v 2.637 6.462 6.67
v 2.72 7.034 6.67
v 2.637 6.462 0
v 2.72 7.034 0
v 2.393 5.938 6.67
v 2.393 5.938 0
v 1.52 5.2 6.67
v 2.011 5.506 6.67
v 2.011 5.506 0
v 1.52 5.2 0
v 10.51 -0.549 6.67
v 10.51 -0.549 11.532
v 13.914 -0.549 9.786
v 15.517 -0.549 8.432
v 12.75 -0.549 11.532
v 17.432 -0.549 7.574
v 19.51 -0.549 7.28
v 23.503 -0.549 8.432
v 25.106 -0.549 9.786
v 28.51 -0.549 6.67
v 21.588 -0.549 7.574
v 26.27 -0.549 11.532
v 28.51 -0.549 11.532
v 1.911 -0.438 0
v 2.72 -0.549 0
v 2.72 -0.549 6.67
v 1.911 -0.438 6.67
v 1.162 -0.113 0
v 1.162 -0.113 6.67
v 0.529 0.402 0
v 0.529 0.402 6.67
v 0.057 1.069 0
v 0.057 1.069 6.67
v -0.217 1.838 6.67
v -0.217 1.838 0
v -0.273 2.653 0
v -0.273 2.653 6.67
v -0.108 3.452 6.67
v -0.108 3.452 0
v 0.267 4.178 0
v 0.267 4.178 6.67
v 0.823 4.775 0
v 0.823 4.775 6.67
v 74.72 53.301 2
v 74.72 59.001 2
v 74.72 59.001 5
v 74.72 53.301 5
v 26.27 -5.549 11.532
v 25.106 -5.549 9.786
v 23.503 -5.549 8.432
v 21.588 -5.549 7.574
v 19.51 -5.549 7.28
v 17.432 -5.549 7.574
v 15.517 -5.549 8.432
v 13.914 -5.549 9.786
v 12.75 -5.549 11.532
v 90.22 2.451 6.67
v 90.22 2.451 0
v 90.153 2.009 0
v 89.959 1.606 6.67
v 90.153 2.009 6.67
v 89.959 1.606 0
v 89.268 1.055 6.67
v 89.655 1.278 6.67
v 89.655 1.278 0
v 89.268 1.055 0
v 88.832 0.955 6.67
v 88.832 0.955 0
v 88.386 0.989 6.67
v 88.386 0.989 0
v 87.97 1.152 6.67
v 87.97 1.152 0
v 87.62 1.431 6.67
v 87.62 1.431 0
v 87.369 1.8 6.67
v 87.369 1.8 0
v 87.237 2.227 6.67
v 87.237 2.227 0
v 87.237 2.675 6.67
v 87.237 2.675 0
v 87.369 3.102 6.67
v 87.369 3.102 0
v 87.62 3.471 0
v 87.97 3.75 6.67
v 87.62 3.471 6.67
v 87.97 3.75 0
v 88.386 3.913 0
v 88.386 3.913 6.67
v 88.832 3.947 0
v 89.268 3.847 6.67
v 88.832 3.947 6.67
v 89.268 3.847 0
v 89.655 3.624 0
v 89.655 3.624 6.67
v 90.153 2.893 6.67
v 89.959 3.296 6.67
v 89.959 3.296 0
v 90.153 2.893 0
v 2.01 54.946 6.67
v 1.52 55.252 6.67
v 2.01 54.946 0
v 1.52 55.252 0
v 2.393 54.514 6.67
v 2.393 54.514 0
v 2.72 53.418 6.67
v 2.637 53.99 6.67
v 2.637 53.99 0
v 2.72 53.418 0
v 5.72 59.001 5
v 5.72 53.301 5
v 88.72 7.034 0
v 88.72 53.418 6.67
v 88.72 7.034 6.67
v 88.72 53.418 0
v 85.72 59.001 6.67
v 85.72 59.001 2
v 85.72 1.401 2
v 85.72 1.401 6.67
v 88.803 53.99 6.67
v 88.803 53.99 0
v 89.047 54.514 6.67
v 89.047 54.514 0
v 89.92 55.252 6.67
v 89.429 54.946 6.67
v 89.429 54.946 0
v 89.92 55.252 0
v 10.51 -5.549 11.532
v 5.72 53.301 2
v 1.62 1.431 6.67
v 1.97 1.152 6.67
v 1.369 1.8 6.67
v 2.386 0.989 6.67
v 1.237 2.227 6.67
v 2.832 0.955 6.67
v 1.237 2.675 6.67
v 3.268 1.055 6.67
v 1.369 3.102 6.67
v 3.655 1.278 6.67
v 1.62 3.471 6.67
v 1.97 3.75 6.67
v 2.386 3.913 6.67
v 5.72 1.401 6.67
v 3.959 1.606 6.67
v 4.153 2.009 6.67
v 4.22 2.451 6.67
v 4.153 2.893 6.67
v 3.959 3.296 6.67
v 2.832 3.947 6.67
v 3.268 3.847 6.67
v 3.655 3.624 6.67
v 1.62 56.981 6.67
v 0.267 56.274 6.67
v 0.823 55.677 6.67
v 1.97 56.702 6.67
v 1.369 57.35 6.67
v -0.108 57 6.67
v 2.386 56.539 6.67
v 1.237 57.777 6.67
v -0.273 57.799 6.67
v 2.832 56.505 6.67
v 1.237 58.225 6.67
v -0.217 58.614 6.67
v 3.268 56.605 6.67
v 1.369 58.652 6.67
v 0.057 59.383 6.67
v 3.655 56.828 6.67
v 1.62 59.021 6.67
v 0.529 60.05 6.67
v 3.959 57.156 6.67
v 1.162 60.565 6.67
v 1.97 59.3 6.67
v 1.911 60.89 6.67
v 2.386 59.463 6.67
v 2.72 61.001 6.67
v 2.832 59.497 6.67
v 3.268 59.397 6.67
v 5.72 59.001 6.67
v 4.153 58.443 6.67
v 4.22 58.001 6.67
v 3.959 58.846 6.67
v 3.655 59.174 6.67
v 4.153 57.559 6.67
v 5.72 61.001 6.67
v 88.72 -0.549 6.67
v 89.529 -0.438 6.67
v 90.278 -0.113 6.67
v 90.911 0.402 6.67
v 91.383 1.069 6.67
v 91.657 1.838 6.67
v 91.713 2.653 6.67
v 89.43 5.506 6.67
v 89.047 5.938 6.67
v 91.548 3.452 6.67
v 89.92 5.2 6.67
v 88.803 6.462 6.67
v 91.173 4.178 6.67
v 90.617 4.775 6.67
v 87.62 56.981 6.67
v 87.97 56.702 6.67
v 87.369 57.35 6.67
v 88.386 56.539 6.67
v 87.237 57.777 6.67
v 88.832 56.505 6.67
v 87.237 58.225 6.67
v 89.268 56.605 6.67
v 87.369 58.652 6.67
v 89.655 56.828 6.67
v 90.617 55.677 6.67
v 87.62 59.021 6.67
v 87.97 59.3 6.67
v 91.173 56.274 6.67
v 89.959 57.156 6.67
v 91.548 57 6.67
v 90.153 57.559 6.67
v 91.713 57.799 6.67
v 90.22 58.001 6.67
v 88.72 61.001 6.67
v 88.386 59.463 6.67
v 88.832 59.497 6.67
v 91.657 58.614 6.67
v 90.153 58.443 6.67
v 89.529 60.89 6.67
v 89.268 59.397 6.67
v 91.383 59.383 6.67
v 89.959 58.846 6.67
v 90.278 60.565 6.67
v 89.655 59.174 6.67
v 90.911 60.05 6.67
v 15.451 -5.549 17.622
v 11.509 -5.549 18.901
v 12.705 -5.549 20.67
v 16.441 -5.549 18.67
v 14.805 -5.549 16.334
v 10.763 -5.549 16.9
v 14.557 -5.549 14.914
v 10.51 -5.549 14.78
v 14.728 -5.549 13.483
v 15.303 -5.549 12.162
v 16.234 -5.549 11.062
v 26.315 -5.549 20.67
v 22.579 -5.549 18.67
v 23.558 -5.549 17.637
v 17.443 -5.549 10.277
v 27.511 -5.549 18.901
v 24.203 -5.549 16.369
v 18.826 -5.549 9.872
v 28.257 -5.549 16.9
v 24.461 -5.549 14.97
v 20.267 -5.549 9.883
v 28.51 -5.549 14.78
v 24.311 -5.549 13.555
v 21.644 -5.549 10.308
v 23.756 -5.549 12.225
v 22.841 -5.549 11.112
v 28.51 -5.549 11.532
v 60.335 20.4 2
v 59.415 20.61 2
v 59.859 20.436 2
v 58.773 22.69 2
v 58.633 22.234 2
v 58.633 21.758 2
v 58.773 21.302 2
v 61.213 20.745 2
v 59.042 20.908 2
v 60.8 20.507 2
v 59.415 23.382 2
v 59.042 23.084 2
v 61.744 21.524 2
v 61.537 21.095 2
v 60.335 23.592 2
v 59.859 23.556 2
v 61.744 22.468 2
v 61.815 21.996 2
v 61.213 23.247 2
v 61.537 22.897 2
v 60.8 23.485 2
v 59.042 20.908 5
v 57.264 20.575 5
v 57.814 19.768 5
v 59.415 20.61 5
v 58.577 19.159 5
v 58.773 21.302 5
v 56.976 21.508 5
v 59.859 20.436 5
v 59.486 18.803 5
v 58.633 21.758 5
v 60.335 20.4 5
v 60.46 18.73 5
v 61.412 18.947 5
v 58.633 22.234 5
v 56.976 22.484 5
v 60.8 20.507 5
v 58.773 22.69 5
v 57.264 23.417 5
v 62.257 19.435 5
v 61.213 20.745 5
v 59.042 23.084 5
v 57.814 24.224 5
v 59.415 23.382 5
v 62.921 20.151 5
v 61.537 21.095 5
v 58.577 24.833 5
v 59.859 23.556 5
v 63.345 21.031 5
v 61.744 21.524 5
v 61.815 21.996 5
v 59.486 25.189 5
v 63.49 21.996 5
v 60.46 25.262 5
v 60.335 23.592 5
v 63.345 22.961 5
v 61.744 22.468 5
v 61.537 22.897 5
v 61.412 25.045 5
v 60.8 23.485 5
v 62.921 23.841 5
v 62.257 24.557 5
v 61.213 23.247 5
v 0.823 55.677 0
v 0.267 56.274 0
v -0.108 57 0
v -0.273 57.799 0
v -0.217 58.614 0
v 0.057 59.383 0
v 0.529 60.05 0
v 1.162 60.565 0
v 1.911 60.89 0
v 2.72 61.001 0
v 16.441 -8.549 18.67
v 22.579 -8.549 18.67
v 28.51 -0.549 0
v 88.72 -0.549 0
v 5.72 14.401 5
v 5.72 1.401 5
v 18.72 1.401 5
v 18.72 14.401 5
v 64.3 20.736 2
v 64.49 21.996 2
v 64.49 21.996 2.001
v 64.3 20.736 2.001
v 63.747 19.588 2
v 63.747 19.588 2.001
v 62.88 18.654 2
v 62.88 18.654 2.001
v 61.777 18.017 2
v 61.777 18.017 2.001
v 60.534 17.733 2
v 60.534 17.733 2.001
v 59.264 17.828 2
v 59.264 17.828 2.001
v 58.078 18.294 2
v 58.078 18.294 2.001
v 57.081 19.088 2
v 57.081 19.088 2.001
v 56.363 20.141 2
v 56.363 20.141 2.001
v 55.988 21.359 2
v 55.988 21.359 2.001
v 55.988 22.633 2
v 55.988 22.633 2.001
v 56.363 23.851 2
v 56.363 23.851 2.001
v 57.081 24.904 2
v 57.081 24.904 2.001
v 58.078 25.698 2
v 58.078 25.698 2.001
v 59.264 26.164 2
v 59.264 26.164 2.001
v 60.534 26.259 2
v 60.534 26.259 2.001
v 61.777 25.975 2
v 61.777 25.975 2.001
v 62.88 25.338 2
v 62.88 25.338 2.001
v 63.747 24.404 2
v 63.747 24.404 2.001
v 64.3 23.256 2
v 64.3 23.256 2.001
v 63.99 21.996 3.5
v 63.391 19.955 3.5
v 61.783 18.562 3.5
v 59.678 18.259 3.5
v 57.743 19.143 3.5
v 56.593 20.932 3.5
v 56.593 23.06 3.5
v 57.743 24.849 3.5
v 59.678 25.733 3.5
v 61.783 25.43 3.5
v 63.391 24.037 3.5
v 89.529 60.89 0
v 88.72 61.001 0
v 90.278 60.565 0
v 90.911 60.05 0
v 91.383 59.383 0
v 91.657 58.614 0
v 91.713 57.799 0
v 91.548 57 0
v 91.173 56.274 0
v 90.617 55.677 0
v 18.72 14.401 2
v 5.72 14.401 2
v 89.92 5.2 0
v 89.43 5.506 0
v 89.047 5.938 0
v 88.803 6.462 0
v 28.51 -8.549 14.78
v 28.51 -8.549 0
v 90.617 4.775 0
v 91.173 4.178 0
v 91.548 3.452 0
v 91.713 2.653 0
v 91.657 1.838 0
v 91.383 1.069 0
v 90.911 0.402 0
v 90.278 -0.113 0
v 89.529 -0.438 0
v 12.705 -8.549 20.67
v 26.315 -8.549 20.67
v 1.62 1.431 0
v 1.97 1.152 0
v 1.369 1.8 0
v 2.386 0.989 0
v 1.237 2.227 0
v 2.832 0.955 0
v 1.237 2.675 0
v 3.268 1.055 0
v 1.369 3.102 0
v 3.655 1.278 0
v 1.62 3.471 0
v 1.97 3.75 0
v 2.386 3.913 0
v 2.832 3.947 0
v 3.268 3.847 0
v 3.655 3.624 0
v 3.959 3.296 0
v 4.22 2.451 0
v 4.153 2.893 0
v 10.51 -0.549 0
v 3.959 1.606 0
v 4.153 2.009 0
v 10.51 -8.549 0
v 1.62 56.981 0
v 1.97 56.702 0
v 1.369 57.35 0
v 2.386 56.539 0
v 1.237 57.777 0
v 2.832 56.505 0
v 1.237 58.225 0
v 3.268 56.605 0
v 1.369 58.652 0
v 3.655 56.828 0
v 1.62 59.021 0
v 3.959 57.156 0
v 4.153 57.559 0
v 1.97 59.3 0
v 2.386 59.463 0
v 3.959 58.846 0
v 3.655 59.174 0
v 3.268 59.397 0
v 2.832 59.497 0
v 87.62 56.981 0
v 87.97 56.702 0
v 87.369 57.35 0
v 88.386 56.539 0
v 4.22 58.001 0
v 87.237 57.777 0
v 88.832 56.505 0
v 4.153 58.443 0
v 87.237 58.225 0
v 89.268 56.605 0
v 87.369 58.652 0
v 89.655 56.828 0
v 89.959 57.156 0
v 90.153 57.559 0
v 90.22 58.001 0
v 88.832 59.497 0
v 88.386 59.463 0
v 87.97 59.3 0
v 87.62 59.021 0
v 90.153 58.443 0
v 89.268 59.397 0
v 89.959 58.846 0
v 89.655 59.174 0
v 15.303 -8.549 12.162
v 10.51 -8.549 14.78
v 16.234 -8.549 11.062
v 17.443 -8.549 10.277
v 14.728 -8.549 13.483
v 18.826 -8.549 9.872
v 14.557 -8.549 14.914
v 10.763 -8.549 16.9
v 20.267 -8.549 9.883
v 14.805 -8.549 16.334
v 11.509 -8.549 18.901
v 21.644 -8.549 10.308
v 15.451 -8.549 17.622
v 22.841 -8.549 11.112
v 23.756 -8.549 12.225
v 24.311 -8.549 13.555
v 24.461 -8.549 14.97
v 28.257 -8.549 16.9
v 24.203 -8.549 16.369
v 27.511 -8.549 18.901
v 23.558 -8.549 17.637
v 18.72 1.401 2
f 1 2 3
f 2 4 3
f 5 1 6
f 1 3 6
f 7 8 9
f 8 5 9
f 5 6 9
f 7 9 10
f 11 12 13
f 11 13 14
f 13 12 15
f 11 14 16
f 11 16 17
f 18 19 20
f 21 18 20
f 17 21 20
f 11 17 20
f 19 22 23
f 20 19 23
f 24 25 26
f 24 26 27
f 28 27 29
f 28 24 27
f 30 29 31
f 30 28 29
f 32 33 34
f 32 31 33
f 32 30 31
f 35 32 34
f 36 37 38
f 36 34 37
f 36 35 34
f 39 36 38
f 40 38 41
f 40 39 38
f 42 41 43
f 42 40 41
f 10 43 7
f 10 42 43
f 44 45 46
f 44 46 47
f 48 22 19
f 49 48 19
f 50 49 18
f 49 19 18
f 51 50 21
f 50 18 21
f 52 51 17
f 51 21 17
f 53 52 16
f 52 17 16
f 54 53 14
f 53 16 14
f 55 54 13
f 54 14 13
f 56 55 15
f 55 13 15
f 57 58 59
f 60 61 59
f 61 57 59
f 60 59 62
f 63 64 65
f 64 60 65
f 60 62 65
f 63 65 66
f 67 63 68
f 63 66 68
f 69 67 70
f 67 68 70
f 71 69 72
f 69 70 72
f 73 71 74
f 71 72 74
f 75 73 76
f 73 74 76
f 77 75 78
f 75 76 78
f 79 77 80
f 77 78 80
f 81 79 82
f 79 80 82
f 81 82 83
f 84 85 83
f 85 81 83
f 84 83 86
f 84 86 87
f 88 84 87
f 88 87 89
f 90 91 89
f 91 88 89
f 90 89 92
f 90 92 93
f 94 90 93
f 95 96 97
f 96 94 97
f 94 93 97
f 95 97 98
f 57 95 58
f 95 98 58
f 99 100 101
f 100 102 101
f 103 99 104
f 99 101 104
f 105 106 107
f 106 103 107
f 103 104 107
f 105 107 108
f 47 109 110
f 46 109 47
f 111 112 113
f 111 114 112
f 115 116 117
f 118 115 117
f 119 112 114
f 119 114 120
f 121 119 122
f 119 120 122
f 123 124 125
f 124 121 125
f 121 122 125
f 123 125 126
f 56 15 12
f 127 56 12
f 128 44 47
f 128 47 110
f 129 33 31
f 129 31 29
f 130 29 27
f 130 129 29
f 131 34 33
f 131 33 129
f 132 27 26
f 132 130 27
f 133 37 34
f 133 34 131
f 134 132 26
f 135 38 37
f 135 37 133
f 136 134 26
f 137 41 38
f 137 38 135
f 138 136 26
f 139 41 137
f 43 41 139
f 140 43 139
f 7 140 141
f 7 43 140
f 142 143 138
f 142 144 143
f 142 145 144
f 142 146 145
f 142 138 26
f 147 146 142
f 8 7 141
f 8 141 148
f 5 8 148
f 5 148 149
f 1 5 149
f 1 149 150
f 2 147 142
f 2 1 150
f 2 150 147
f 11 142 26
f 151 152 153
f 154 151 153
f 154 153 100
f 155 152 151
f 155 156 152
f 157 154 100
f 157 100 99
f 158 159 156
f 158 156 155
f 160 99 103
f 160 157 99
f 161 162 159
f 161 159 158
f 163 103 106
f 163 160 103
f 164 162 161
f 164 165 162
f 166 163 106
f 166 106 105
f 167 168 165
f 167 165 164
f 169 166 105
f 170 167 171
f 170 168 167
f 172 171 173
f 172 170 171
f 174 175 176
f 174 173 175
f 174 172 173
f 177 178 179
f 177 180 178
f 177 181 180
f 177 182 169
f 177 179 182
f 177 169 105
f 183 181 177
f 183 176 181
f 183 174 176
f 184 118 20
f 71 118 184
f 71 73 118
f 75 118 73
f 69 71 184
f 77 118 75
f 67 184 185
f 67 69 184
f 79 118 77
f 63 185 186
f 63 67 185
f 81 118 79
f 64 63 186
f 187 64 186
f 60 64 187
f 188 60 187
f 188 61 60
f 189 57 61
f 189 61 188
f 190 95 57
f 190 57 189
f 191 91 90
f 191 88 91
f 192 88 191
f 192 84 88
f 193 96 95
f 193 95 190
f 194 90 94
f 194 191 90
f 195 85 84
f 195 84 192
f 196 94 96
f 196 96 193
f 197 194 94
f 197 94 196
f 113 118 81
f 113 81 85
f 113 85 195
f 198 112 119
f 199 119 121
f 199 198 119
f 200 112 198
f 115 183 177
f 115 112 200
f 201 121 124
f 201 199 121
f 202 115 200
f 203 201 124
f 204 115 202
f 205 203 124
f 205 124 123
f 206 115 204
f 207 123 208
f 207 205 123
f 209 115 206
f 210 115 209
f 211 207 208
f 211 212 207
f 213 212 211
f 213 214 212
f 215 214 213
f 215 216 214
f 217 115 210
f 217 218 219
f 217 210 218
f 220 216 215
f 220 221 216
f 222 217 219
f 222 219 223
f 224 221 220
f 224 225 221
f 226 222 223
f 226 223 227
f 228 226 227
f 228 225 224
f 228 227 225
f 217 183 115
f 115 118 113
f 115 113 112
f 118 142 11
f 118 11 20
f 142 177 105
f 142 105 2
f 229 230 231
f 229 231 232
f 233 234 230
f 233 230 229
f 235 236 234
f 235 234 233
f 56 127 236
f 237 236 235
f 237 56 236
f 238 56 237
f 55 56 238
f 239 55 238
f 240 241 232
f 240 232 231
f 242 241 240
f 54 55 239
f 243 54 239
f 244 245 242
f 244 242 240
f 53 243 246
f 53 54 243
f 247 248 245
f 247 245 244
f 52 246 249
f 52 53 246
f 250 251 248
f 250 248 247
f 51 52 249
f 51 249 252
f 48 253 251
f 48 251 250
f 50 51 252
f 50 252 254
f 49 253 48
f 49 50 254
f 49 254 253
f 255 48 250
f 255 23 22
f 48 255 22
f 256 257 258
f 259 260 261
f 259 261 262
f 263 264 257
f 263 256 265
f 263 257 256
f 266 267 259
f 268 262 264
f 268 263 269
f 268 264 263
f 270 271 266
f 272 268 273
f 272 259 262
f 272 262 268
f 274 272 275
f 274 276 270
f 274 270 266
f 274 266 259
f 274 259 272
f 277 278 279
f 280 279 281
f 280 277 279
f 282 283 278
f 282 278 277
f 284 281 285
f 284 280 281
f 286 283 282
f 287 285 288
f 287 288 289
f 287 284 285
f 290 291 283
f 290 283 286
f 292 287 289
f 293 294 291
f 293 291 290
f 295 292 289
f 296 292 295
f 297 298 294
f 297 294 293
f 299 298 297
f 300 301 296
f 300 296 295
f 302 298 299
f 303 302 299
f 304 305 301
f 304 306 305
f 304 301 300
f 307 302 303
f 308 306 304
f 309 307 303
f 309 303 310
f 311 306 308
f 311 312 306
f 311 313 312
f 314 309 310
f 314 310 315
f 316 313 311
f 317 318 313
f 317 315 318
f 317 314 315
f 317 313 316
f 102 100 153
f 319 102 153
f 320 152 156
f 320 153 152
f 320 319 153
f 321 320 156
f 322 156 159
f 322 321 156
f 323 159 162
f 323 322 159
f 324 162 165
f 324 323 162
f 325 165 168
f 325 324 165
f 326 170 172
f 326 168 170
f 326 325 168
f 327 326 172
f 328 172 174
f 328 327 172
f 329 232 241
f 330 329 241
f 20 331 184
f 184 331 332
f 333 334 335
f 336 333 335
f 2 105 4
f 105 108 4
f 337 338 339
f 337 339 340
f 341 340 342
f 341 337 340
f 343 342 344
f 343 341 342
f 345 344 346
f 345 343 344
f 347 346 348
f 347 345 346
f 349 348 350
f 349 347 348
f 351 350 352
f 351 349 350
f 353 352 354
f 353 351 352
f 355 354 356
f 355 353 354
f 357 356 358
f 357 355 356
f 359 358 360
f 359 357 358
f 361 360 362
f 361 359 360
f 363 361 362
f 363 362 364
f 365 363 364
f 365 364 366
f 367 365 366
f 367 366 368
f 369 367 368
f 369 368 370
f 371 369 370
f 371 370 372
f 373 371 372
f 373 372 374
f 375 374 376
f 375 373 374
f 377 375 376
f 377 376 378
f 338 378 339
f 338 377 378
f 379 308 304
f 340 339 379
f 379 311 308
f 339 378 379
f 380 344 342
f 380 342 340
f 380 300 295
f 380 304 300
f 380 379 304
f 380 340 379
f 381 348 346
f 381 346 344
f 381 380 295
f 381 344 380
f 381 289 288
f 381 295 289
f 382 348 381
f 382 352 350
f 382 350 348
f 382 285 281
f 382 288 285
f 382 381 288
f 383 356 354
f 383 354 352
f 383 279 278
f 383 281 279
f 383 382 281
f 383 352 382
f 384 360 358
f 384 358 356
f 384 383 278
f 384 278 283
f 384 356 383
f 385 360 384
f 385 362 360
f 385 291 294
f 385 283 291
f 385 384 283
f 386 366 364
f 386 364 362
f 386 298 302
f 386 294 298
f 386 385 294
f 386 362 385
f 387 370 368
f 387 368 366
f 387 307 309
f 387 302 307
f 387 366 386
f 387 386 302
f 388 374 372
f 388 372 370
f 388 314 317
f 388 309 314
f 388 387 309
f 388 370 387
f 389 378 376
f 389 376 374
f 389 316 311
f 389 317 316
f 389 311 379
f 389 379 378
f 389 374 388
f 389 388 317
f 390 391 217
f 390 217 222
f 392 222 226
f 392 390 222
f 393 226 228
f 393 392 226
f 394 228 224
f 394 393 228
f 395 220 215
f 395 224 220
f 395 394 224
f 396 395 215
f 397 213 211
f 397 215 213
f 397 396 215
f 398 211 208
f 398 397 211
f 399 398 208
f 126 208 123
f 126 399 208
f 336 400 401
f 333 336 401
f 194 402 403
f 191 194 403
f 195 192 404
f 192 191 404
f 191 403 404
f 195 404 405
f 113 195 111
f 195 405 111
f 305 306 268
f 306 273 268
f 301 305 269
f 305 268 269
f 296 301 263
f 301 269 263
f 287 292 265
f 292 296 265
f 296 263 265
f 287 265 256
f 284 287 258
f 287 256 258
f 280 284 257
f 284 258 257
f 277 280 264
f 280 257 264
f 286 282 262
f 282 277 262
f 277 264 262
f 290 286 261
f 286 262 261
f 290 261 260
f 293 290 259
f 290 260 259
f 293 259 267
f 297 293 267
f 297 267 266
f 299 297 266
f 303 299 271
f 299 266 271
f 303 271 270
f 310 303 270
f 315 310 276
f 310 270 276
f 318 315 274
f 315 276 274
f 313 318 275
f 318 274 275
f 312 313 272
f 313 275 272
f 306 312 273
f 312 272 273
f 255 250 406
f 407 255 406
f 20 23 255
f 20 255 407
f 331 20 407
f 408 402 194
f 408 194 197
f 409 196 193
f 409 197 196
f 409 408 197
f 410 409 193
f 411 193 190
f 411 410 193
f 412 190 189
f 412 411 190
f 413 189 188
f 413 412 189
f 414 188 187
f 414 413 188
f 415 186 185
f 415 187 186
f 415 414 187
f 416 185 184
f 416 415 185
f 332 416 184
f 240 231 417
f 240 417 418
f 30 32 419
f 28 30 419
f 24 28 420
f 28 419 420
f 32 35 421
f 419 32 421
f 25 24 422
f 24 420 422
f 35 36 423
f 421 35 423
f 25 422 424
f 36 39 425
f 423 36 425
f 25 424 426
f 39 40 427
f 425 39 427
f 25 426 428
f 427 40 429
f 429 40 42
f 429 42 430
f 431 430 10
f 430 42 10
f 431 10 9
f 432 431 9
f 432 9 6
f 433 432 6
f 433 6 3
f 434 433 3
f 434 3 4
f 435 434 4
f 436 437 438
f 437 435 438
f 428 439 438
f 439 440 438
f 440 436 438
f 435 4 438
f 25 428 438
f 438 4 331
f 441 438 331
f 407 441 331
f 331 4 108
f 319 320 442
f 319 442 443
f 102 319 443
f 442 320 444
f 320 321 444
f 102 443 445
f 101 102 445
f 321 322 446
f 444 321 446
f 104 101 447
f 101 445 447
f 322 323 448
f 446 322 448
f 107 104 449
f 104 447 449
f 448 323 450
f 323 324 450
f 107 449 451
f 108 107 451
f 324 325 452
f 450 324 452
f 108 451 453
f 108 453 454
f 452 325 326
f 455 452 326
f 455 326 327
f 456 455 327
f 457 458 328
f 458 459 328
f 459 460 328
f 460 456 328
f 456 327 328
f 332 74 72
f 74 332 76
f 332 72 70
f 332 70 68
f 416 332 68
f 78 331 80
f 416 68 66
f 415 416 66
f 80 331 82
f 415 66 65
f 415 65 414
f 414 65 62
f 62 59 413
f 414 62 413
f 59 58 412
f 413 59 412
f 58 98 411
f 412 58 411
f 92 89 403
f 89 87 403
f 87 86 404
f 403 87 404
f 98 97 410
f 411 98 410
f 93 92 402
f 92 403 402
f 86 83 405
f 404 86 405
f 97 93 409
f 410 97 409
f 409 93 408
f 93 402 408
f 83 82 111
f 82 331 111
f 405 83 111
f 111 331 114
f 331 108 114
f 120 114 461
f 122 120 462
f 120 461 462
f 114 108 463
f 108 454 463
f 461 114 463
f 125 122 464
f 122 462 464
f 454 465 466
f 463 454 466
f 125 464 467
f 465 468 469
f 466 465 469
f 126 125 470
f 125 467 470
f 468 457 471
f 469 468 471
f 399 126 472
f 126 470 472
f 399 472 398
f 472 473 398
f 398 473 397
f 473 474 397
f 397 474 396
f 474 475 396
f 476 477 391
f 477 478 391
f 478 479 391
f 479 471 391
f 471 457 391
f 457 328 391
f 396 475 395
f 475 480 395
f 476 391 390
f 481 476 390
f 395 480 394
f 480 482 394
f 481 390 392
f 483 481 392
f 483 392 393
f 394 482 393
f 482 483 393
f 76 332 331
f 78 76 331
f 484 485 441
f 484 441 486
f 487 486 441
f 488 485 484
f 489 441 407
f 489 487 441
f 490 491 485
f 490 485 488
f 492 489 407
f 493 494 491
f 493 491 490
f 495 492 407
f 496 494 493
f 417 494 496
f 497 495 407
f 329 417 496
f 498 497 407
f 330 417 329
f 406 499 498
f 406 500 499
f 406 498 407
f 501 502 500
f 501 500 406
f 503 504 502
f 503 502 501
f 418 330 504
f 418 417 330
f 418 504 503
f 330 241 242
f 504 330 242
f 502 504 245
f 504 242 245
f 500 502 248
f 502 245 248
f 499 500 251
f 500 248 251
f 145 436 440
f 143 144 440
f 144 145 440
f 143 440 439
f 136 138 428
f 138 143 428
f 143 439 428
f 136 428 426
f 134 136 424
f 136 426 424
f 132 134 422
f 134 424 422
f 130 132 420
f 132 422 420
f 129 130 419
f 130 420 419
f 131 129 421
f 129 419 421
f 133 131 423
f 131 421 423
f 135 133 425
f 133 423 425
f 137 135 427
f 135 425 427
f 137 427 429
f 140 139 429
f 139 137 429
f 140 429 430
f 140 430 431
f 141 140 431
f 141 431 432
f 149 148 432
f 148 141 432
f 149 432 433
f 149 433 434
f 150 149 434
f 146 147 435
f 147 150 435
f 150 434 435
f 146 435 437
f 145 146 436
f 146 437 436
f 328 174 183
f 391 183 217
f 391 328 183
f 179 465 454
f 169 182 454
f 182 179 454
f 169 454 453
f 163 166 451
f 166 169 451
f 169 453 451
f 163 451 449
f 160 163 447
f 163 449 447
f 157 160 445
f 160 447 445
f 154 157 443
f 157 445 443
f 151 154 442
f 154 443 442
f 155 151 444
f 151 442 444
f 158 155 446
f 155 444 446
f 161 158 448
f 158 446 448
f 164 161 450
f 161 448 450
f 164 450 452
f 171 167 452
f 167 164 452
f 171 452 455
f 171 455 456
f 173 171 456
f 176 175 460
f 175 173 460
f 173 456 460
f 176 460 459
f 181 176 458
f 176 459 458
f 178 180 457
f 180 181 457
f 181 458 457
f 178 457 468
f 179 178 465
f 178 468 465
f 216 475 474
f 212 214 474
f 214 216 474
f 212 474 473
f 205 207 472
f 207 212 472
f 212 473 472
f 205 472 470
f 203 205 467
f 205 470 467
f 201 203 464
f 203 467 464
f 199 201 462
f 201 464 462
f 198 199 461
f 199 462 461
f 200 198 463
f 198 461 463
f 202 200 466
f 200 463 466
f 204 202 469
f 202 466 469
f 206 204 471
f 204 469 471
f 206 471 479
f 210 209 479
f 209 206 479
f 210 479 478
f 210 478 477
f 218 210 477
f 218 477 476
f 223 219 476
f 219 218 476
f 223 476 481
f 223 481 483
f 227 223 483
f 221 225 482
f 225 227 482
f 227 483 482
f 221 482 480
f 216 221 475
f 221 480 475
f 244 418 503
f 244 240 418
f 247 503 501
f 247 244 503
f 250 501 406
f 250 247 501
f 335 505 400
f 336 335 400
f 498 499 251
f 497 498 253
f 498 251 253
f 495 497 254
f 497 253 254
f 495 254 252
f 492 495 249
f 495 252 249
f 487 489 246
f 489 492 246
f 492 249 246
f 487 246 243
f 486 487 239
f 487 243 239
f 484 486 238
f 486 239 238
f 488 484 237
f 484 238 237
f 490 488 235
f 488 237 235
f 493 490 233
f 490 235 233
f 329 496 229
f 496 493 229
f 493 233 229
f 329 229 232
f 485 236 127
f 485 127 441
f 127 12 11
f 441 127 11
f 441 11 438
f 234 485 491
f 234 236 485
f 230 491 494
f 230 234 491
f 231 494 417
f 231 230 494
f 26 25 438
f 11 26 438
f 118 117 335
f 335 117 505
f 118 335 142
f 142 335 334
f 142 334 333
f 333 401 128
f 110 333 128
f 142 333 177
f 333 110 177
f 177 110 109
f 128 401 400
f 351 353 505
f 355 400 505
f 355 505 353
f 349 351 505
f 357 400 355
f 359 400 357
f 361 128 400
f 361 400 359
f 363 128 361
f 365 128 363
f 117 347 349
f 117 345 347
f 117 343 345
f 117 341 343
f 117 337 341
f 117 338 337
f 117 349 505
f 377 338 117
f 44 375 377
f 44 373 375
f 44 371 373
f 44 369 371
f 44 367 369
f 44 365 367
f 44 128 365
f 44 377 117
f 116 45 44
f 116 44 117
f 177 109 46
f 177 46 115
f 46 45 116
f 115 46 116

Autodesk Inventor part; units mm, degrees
ref_plane "YZ Plane" through (0, 0, 0) normal (1, 0, 0) x (0, 1, 0)
ref_plane "XZ Plane" through (0, 0, 0) normal (0, 1, 0) x (-1, 0, 0)
ref_plane "XY Plane" through (0, 0, 0) normal (0, 0, 1) x (1, 0, 0)
sketch "Sketch1" plane through (0, 0, 0) normal (0, 0, 1) x (1, 0, 0)
  line L0 (85.72, 30.226) -> (85.72, 1.401) construction
  line L1 (85.72, 1.401) -> (45.72, 1.401) construction
  line L2 (85.72, 1.401) -> (5.72, 1.401) construction
  line L3 (5.72, 1.401) -> (5.72, 59.001) construction
  line L4 (5.72, 59.001) -> (85.72, 59.001) construction
  line L5 (85.72, 59.001) -> (85.72, 1.401) construction
  line L6 (61.99, 1.401) -> (61.99, 20.221) construction
  line L7 (61.99, 20.221) -> (85.72, 20.221) construction
  line L8 (61.99, 20.221) -> (58.44, 20.221) construction
  line L9 (61.99, 23.771) -> (61.99, 20.221) construction
  line L10 (60.215, 20.221) -> (61.99, 20.221) construction
  line L11 (61.99, 20.221) -> (61.99, 21.996) construction
  line L12 (61.99, 21.996) -> (60.215, 21.996) construction
  line L13 (60.215, 21.996) -> (60.215, 20.221) construction
  circle A0 centre (60.215, 21.996) radius 1.775 construction
  circle A1 centre (60.215, 21.996) radius 2.775 construction
  circle A2 centre (60.215, 21.996) radius 4.275 construction
  line L14 (5.72, 59.001) -> (74.72, 59.001) construction
  line L15 (74.72, 59.001) -> (74.72, 53.301) construction
  line L16 (74.72, 53.301) -> (5.72, 53.301) construction
  line L17 (5.72, 53.301) -> (5.72, 59.001) construction
  line L18 (5.72, 1.401) -> (18.72, 1.401) construction
  line L19 (18.72, 1.401) -> (18.72, 14.401) construction
  line L20 (18.72, 14.401) -> (5.72, 14.401) construction
  line L21 (5.72, 14.401) -> (5.72, 1.401) construction
  circle A3 centre (2.72, 58.001) radius 1.5
  line L22 (3.72, 61.001) -> (5.72, 61.001)
  line L23 (5.72, 61.001) -> (5.72, 59.001) construction
  line L24 (5.72, 61.001) -> (2.72, 61.001)
  line L25 (5.72, 55.001) -> (5.72, 61.001) construction
  line L26 (45.72, 1.9437) -> (45.72, 30.226) construction
  line L27 (45.72, 30.226) -> (85.72, 30.226) construction
  arc A4 (2.72, 61.001) -> (1.52, 55.2515) centre (2.72, 58.001) ccw
  circle A5 centre (2.72, 2.451) radius 1.5
  line L28 (3.72, -0.549) -> (5.72, -0.549)
  line L29 (5.72, -0.549) -> (2.72, -0.549)
  arc A6 (1.52, 5.2005) -> (2.72, -0.549) centre (2.72, 2.451) ccw
  circle A7 centre (88.72, 58.001) radius 1.5
  line L30 (85.72, 61.001) -> (88.72, 61.001)
  arc A8 (89.92, 55.2515) -> (88.72, 61.001) centre (88.72, 58.001) ccw
  line L31 (85.72, -0.549) -> (88.72, -0.549)
  circle A9 centre (88.72, 2.451) radius 1.5
  arc A10 (88.72, -0.549) -> (89.92, 5.2005) centre (88.72, 2.451) ccw
  line L32 (2.72, 53.4184) -> (2.72, 7.0336)
  line L33 (5.72, 61.001) -> (85.72, 61.001)
  line L34 (88.72, 53.4184) -> (88.72, 7.0336)
  line L35 (85.72, -0.549) -> (5.72, -0.549)
  arc A11 (2.72, 53.4184) -> (1.52, 55.2515) centre (0.72, 53.4184) ccw
  arc A12 (1.52, 5.2005) -> (2.72, 7.0336) centre (0.72, 7.0336) ccw
  arc A13 (88.72, 7.0336) -> (89.92, 5.2005) centre (90.72, 7.0336) ccw
  arc A14 (89.92, 55.2515) -> (88.72, 53.4184) centre (90.72, 53.4184) ccw
  point P0 (0, 0)
  point P1 (2.72, 55.001)
  point P2 (2.72, 5.451)
  point P3 (91.44, 0)
  point P4 (88.72, 55.001)
  point P5 (88.72, 5.451)
  dimension "d32" = 40
  dimension "d33" = 28.825
  dimension "d34" = 80
  dimension "d37" = 18.82
  dimension "d40" = 5.55
  dimension "d41" = 8.55
  dimension "d42" = 69
  dimension "d43" = 5.7
  dimension "d44" = 13
  dimension "d45" = 13
  dimension "d52" = 2
  dimension "d80" = 3
extrude "Extrusion1" add sketch "Sketch1" along normal blind 2
sketch "Sketch2" plane through (0, 0, 2) normal (0, 0, 1) x (1, 0, 0)
  line L0 (85.72, 30.226) -> (85.72, 1.401)
  line L1 (5.72, 14.401) -> (5.72, 53.301)
  line L2 (74.72, 59.001) -> (85.72, 59.001)
  line L3 (85.72, 59.001) -> (85.72, 1.401)
  line L4 (61.815, 21.996) -> (60.215, 21.996)
  circle A0 centre (60.215, 21.996) radius 1.6
  circle A1 centre (60.215, 21.996) radius 2.775 construction
  circle A2 centre (60.215, 21.996) radius 4.275
  line L5 (45.72, 59.001) -> (74.72, 59.001)
  line L6 (74.72, 59.001) -> (74.72, 53.301)
  line L7 (74.72, 53.301) -> (5.72, 53.301)
  line L8 (5.72, 58.001) -> (5.72, 59.001)
  line L9 (5.72, 1.401) -> (18.72, 1.401)
  line L10 (18.72, 1.401) -> (18.72, 14.401)
  line L11 (18.72, 14.401) -> (5.72, 14.401)
  line L12 (5.72, 2.451) -> (5.72, 1.401)
  circle A3 centre (2.72, 58.001) radius 1.5
  line L13 (3.72, 61.001) -> (5.72, 61.001)
  line L14 (5.72, 61.001) -> (5.72, 59.001)
  line L15 (5.72, 61.001) -> (2.72, 61.001)
  line L16 (5.72, 59.001) -> (5.72, 61.001)
  arc A4 (2.72, 61.001) -> (1.52, 55.2515) centre (2.72, 58.001) ccw
  line L17 (3.72, -0.549) -> (5.72, -0.549)
  line L18 (5.72, -0.549) -> (2.72, -0.549)
  circle A5 centre (2.72, 2.451) radius 1.5
  arc A6 (1.52, 5.2005) -> (2.72, -0.549) centre (2.72, 2.451) ccw
  line L19 (85.72, -0.549) -> (88.72, -0.549)
  circle A7 centre (88.72, 2.451) radius 1.5
  arc A8 (88.72, -0.549) -> (89.92, 5.2005) centre (88.72, 2.451) ccw
  circle A9 centre (88.72, 58.001) radius 1.5
  arc A10 (89.92, 55.2515) -> (88.72, 61.001) centre (88.72, 58.001) ccw
  line L20 (85.72, 61.001) -> (88.72, 61.001)
  line L21 (2.72, 53.4184) -> (2.72, 7.0336)
  line L22 (5.72, 61.001) -> (85.72, 61.001)
  line L23 (88.72, 53.4184) -> (88.72, 7.0336)
  line L24 (85.72, -0.549) -> (5.72, -0.549)
  arc A11 (2.72, 53.4184) -> (1.52, 55.2515) centre (0.72, 53.4184) ccw
  arc A12 (1.52, 5.2005) -> (2.72, 7.0336) centre (0.72, 7.0336) ccw
  arc A13 (88.72, 7.0336) -> (89.92, 5.2005) centre (90.72, 7.0336) ccw
  arc A14 (89.92, 55.2515) -> (88.72, 53.4184) centre (90.72, 53.4184) ccw
  line L25 (85.72, 1.401) -> (74.72, 1.401)
  line L26 (61.99, 1.401) -> (45.72, 1.401)
  line L27 (85.72, 1.401) -> (74.72, 1.401)
  line L28 (61.99, 1.401) -> (18.72, 1.401)
  line L29 (61.99, 1.401) -> (74.72, 1.401)
  point P0 (0, 0)
  point P1 (2.72, 55.001)
  point P2 (2.72, 5.451)
  point P3 (91.44, 0)
  point P4 (88.72, 5.451)
  point P5 (88.72, 55.001)
  dimension "d89" = 3.2
  dimension "d53" = 40
  dimension "d54" = 28.825
  dimension "d55" = 80
  dimension "d57" = 5.55
  dimension "d58" = 8.55
  dimension "d59" = 69
  dimension "d60" = 5.7
  dimension "d61" = 13
  dimension "d62" = 13
  dimension "d63" = 2
  dimension "d81" = 3
  dimension "d82" = 3
  dimension "d83" = 3
  dimension "d84" = 3
extrude "Extrusion2" add sketch "Sketch2" along normal blind 3
sketch "Sketch5" plane through (0, 0, 5) normal (0, 0, 1) x (1, 0, 0)
  line L0 (85.72, 30.226) -> (85.72, 1.401)
  line L1 (85.72, 1.401) -> (45.72, 1.401)
  line L2 (85.72, 1.401) -> (5.72, 1.401)
  line L3 (5.72, 1.401) -> (5.72, 59.001)
  line L4 (5.72, 59.001) -> (85.72, 59.001)
  line L5 (85.72, 59.001) -> (85.72, 1.401)
  line L6 (5.72, 59.001) -> (74.72, 59.001)
  line L7 (5.72, 53.301) -> (5.72, 59.001)
  line L8 (5.72, 1.401) -> (18.72, 1.401)
  line L9 (5.72, 14.401) -> (5.72, 1.401)
  circle A0 centre (2.72, 58.001) radius 1.5
  line L10 (3.72, 61.001) -> (5.72, 61.001)
  line L11 (5.72, 61.001) -> (5.72, 59.001)
  line L12 (5.72, 61.001) -> (2.72, 61.001)
  line L13 (5.72, 55.001) -> (5.72, 61.001)
  arc A1 (2.72, 61.001) -> (1.52, 55.2515) centre (2.72, 58.001) ccw
  line L14 (3.72, -0.549) -> (5.72, -0.549)
  line L15 (5.72, -0.549) -> (2.72, -0.549)
  circle A2 centre (2.72, 2.451) radius 1.5
  arc A3 (1.52, 5.2005) -> (2.72, -0.549) centre (2.72, 2.451) ccw
  line L16 (85.72, -0.549) -> (88.72, -0.549)
  circle A4 centre (88.72, 2.451) radius 1.5
  arc A5 (88.72, -0.549) -> (89.92, 5.2005) centre (88.72, 2.451) ccw
  circle A6 centre (88.72, 58.001) radius 1.5
  arc A7 (89.92, 55.2515) -> (88.72, 61.001) centre (88.72, 58.001) ccw
  line L17 (85.72, 61.001) -> (88.72, 61.001)
  line L18 (2.72, 53.4184) -> (2.72, 7.0336)
  line L19 (5.72, 61.001) -> (85.72, 61.001)
  line L20 (88.72, 53.4184) -> (88.72, 7.0336)
  line L21 (85.72, -0.549) -> (5.72, -0.549)
  arc A8 (2.72, 53.4184) -> (1.52, 55.2515) centre (0.72, 53.4184) ccw
  arc A9 (1.52, 5.2005) -> (2.72, 7.0336) centre (0.72, 7.0336) ccw
  arc A10 (88.72, 7.0336) -> (89.92, 5.2005) centre (90.72, 7.0336) ccw
  arc A11 (89.92, 55.2515) -> (88.72, 53.4184) centre (90.72, 53.4184) ccw
  point P0 (0, 0)
  point P1 (0, 0)
  point P2 (2.72, 55.001)
  point P3 (2.72, 5.451)
  point P4 (91.44, 0)
  point P5 (88.72, 5.451)
  point P6 (88.72, 55.001)
  dimension "d64" = 40
  dimension "d65" = 28.825
  dimension "d66" = 80
  dimension "d74" = 2
  dimension "d85" = 3
  dimension "d86" = 3
  dimension "d87" = 3
  dimension "d88" = 3
extrude "Extrusion5" add sketch "Sketch5" along normal blind 1.67
chamfer "Chamfer1" distance 1 distance2 3 1 edges at (55.94, 21.996, 5) measured on face at (63.5414, 21.5273, 5)
sketch "Sketch6" plane through (2.72, -0.549, 0) normal (0, -1, 0) x (1, 0, 0)
  line L0 (-2.72, 20.7114) -> (-2.72, 7.1986) construction
  arc A0 (14.6348, 17.447) -> (18.9452, 17.447) centre (16.79, 14.78) ccw construction
  line L1 (14.6347, 17.447) -> (18.9453, 17.447) construction
  line L2 (-3, 20.67) -> (-3, 6.67) construction
  line L3 (0, 13.555) -> (92, 13.555) construction
  line L4 (0.28, 13.555) -> (46, 13.555) construction
  line L5 (13.7208, 18.67) -> (19.8592, 18.67)
  line L6 (8.6741, 18.67) -> (83, 18.67) construction
  line L7 (83, 18.67) -> (8.6741, 18.67) construction
  circle A1 centre (16.79, 14.78) radius 7.15 construction
  circle A2 centre (16.79, 14.78) radius 6.25 construction
  line L8 (18.077, 2.0446) -> (21.077, 2.0446)
  line L9 (13.0545, 18.0609) -> (13.0545, 18.67) construction
  line L10 (11.835, 14.78) -> (11.4131, 5.117) construction
  line L11 (11.835, 14.78) -> (21.5072, 14.78) construction
  line L12 (21.745, 14.78) -> (22.1562, 5.3611) construction
  line L13 (21.745, 14.78) -> (31.1729, 14.78) construction
  arc A3 (13.7208, 18.67) -> (21.5912, 13.555) centre (16.79, 14.78) ccw
  arc A4 (21.5912, 13.555) -> (19.8592, 18.67) centre (16.79, 14.78) ccw
  line L14 (22.1562, 5.3611) -> (11.4131, 5.117) construction
  line L15 (-3, 20.67) -> (-3, 6.67)
  line L16 (0, 6.67) -> (-3, 6.67) projected
  arc A5 (9.985, 20.67) -> (23.595, 20.67) centre (16.79, 14.78) ccw
  line L17 (16.79, 14.78) -> (7.79, 14.78) construction
  line L18 (7.79, 14.78) -> (7.79, 0)
  line L19 (86, 0) -> (0, 0) projected
  line L20 (16.79, 14.78) -> (25.79, 14.78) construction
  line L21 (25.79, 14.78) -> (25.79, 0)
  line L22 (-3, 20.67) -> (-2.72, 20.67)
  line L23 (9.985, 20.67) -> (35.5259, 20.67)
  point P0 (-2.72, 0)
  point P1 (-2.72, 20.67)
  point P2 (-1.2, 6.67)
  dimension "d90" = 14.3
  dimension "d91" = 12.5
  dimension "d92" = 3
  dimension "d93" = 92.5
  dimension "d94" = 87.5
extrude "Extrusion6" add sketch "Sketch6" along normal blind 8
sketch "Sketch7" plane through (2.72, -8.549, 0) normal (0, -1, 0) x (1, 0, 0)
  point P0 (-2.72, 0)
sketch "Sketch8" plane through (2.72, -0.549, 0) normal (0, 1, 0) x (1, 0, 0)
  line L0 (18.077, 2.0446) -> (21.077, 2.0446)
  line L1 (86, 0) -> (0, 0) construction
  line L2 (22.1562, -5.3611) -> (11.4131, -5.117) construction
  line L3 (18.077, -2.0446) -> (21.077, -2.0446) construction
  line L4 (-2.72, -20.7114) -> (-2.72, -7.1986) construction
  line L5 (-3, -20.67) -> (-3, -6.67) construction
  line L6 (-3, -20.67) -> (-3, -6.67)
  line L7 (0, -13.555) -> (92, -13.555) construction
  line L8 (0.28, -13.555) -> (46, -13.555) construction
  line L9 (0, -6.67) -> (-3, -6.67)
  line L10 (7.79, -14.78) -> (7.79, 0) construction
  line L11 (25.79, -14.78) -> (25.79, 0) construction
  line L12 (-3, -20.67) -> (-2.72, -20.67)
  line L13 (13.04, -8.2848) -> (20.54, -8.2848) construction
  line L14 (20.54, -8.2848) -> (24.29, -14.78) construction
  line L15 (22.415, -11.5324) -> (28.3907, -11.5324) construction
  line L16 (27.6858, -27.8063) -> (6.6122, -26.5118)
  line L17 (6.6122, -26.5118) -> (5.8176, -11.5324)
  arc A0 (21.5912, -13.555) -> (20.5323, -11.5324) centre (16.79, -14.78) ccw construction
  line L18 (28.3907, -11.5324) -> (23.5504, -11.5324)
  line L19 (10.0296, -11.5324) -> (5.8176, -11.5324)
  arc A1 (23.5504, -11.5324) -> (10.0296, -11.5324) centre (16.79, -14.78) ccw
  line L20 (28.3907, -11.5324) -> (27.6858, -27.8063)
  point P0 (-2.72, 0)
  point P1 (-2.72, 0)
  point P2 (-2.72, -20.67)
  point P3 (-1.2, -6.67)
extrude "Extrusion7" cut sketch "Sketch8" against normal blind 5
properties part number "Redid DAQ Enclosure Bottom TTL"
